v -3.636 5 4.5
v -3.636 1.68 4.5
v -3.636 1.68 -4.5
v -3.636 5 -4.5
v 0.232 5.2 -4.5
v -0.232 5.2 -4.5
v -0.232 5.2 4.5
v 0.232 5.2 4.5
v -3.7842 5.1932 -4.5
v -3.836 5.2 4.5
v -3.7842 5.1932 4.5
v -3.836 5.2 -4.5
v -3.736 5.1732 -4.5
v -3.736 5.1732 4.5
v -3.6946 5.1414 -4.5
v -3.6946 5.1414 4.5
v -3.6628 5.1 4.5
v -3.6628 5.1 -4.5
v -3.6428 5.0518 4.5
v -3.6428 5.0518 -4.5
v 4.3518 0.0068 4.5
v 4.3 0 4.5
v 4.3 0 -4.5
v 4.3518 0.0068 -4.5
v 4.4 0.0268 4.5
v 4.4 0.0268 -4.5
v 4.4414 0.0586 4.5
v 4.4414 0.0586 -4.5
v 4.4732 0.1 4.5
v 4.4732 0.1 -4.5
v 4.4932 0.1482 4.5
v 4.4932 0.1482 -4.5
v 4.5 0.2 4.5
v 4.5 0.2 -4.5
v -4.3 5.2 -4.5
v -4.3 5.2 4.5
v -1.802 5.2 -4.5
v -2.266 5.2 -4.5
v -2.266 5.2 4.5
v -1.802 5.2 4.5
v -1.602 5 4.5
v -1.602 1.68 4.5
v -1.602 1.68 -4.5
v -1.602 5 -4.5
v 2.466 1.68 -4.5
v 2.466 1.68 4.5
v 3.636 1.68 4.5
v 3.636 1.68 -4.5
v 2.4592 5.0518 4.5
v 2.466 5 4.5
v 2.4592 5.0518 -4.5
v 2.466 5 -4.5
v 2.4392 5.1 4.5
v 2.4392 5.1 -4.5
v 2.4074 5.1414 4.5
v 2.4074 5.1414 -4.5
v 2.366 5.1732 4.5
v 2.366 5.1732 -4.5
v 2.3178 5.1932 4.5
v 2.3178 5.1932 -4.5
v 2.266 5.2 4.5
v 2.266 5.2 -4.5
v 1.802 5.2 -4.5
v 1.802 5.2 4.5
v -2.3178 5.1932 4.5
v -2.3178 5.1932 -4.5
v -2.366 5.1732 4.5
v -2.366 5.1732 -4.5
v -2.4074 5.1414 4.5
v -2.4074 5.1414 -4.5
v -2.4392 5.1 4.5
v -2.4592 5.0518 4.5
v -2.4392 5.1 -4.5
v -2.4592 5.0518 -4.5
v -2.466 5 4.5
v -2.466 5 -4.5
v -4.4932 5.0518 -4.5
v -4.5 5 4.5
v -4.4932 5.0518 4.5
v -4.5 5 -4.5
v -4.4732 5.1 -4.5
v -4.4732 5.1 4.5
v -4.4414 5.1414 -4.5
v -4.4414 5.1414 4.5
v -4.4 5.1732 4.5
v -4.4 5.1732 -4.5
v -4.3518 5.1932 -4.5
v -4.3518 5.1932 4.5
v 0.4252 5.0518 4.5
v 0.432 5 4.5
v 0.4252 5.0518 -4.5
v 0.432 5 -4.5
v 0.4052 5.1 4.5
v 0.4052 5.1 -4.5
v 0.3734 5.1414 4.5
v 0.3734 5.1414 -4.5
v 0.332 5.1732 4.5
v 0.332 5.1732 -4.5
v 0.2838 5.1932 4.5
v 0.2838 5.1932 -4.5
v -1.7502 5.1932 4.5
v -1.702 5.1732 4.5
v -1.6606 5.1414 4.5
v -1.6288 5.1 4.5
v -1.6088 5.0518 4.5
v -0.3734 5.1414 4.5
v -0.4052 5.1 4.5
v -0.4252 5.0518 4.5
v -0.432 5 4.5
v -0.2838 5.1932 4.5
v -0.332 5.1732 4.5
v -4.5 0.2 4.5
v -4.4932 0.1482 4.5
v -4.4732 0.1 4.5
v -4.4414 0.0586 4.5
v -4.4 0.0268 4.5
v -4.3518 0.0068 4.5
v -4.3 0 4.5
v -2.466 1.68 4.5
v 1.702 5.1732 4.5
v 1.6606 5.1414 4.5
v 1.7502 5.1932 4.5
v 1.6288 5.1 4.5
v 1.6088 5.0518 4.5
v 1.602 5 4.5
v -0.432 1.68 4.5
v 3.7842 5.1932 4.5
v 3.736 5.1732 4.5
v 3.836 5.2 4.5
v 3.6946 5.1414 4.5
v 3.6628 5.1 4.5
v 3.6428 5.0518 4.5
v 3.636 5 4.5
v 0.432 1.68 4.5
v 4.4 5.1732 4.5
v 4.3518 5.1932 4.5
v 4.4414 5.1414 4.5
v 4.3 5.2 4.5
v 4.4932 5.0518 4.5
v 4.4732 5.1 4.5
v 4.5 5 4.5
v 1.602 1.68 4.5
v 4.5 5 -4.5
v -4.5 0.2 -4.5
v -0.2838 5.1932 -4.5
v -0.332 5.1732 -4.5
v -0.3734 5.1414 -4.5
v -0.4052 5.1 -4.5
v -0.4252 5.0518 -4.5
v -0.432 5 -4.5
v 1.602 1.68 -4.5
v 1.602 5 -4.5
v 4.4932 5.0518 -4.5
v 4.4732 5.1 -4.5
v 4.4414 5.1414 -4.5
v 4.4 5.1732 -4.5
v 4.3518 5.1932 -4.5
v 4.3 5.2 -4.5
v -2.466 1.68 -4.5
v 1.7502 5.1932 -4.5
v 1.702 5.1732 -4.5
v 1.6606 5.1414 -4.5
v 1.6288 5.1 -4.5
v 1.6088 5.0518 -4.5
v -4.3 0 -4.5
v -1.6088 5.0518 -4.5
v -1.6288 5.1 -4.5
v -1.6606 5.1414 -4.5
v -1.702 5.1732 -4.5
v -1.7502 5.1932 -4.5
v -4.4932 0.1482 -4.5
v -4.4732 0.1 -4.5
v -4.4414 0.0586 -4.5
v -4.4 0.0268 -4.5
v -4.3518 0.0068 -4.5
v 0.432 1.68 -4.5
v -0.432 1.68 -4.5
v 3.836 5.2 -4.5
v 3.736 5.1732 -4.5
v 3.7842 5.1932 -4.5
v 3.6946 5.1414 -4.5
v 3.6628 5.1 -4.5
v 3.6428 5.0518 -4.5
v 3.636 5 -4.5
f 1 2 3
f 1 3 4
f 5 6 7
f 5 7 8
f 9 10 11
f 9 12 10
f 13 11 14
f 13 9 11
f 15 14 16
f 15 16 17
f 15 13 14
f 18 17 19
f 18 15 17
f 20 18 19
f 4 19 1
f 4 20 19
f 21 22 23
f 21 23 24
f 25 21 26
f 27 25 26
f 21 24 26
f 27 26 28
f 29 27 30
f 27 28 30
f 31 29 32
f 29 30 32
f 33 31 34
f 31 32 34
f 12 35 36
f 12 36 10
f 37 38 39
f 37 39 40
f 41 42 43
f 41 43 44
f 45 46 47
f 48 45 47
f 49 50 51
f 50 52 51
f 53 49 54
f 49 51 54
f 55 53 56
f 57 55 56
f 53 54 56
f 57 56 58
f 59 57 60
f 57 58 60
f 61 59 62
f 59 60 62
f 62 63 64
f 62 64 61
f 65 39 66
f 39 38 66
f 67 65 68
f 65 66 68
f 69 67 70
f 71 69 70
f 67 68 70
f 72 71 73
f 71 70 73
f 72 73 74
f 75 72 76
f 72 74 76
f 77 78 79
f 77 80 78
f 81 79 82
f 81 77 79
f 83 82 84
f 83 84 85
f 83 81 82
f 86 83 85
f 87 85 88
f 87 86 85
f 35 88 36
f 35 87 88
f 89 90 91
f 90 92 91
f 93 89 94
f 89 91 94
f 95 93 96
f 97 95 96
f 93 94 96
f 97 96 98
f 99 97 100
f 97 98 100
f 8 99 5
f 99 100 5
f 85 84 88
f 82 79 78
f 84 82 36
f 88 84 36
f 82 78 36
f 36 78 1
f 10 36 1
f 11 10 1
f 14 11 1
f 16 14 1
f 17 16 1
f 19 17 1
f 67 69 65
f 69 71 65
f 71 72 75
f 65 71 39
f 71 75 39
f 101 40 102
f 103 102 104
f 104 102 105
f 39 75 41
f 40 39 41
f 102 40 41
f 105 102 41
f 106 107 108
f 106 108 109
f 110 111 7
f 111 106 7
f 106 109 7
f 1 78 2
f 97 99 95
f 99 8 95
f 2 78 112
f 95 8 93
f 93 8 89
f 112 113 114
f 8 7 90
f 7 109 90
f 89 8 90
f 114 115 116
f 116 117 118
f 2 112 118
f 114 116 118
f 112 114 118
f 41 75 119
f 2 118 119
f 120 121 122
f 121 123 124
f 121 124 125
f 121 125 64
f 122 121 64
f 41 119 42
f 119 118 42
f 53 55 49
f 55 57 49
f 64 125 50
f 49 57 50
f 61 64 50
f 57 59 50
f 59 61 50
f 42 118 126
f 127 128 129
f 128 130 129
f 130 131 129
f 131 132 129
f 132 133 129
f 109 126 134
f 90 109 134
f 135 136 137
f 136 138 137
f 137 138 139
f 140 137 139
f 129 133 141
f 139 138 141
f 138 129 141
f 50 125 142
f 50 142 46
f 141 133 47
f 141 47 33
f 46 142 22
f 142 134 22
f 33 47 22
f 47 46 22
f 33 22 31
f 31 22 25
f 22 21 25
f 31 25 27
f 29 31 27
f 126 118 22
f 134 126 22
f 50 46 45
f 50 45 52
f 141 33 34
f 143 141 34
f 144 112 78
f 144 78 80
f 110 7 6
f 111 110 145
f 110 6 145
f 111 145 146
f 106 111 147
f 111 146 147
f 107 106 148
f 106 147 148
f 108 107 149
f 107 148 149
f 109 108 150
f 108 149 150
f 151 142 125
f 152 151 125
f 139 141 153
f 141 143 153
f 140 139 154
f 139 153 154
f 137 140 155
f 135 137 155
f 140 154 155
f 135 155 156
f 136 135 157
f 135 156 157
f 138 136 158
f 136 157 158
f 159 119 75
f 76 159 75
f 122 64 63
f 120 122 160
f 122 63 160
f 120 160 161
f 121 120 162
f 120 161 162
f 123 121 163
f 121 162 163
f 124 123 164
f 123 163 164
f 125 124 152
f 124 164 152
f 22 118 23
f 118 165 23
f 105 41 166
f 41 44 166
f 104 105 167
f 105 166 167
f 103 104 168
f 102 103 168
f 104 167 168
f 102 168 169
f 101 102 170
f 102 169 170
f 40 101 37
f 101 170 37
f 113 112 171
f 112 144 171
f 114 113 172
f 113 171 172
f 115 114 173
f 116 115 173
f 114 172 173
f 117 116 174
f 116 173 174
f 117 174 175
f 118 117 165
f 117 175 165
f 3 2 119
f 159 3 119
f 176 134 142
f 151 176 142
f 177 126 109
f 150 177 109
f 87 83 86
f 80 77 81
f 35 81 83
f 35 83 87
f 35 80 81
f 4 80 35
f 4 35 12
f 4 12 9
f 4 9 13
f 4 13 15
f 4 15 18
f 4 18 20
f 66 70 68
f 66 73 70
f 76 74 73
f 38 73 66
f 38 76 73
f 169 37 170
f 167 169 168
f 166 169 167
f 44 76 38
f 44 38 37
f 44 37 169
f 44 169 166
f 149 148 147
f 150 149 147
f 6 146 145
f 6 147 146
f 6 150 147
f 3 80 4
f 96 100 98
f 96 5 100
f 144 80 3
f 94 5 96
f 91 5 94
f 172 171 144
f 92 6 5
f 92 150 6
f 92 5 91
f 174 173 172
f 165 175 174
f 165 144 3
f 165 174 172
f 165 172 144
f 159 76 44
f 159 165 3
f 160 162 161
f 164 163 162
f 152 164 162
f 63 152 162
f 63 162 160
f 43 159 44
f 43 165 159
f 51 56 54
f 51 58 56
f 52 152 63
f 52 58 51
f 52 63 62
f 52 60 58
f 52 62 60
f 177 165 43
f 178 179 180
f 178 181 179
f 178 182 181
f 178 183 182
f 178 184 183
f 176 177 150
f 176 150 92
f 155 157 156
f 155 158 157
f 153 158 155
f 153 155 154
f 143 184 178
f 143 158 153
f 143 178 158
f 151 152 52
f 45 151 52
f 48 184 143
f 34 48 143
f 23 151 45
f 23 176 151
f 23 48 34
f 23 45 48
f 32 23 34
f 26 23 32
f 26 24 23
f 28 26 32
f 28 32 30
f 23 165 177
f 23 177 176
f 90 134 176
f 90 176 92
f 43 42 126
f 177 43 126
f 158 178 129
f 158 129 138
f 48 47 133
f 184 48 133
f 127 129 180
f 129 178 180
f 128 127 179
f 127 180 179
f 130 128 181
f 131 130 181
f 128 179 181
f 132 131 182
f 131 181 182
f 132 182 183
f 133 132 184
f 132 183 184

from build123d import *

# Parameters (mm, degrees)
SCHIZZO1_W                   = 9
SCHIZZO1_H                   = 9
ESTRUSIONE_ESTRUSIONE1_DEPTH = 5.2
SCHIZZO2_W                   = 1.17
SCHIZZO2_H                   = 3.52
TAGLIO_ESTRUSIONE1_DEPTH     = 10
RACCORDO1_R                  = 0.2


with BuildPart() as part:
    # Schizzo1 → Estrusione-Estrusione1 (new body)
    with BuildSketch(Plane(origin=(0, 0, 0), x_dir=(1, 0, 0), z_dir=(0, 1, 0))):
        Rectangle(SCHIZZO1_W, SCHIZZO1_H)
    extrude(amount=ESTRUSIONE_ESTRUSIONE1_DEPTH)

    # Schizzo2 → Taglio-Estrusione1 (cut, through all)
    with BuildSketch(Plane.XY.offset(4.5)):
        with Locations((-3.051, 3.44)):
            Rectangle(SCHIZZO2_W, SCHIZZO2_H)
        with Locations((1.017, 3.44)):
            Rectangle(SCHIZZO2_W, SCHIZZO2_H)
        with Locations((3.051, 3.44)):
            Rectangle(SCHIZZO2_W, SCHIZZO2_H)
        with Locations((-1.017, 3.44)):
            Rectangle(SCHIZZO2_W, SCHIZZO2_H)
    extrude(amount=-TAGLIO_ESTRUSIONE1_DEPTH, mode=Mode.SUBTRACT)

    # Raccordo1
    raccordo1_edges = [part.edges().sort_by_distance(p)[0] for p in [
        (-4.5, 5.2, 0),
        (-3.636, 5.2, 0),
        (-2.466, 5.2, 0),
        (0.432, 5.2, 0),
        (1.602, 5.2, 0),
        (4.5, 5.2, 0),
        (2.466, 5.2, 0),
        (3.636, 5.2, 0),
        (-4.5, 0, 0),
        (4.5, 0, 0),
        (-1.602, 5.2, 0),
        (-0.432, 5.2, 0),
    ]]
    fillet(raccordo1_edges, radius=RACCORDO1_R)


solid = part.part
